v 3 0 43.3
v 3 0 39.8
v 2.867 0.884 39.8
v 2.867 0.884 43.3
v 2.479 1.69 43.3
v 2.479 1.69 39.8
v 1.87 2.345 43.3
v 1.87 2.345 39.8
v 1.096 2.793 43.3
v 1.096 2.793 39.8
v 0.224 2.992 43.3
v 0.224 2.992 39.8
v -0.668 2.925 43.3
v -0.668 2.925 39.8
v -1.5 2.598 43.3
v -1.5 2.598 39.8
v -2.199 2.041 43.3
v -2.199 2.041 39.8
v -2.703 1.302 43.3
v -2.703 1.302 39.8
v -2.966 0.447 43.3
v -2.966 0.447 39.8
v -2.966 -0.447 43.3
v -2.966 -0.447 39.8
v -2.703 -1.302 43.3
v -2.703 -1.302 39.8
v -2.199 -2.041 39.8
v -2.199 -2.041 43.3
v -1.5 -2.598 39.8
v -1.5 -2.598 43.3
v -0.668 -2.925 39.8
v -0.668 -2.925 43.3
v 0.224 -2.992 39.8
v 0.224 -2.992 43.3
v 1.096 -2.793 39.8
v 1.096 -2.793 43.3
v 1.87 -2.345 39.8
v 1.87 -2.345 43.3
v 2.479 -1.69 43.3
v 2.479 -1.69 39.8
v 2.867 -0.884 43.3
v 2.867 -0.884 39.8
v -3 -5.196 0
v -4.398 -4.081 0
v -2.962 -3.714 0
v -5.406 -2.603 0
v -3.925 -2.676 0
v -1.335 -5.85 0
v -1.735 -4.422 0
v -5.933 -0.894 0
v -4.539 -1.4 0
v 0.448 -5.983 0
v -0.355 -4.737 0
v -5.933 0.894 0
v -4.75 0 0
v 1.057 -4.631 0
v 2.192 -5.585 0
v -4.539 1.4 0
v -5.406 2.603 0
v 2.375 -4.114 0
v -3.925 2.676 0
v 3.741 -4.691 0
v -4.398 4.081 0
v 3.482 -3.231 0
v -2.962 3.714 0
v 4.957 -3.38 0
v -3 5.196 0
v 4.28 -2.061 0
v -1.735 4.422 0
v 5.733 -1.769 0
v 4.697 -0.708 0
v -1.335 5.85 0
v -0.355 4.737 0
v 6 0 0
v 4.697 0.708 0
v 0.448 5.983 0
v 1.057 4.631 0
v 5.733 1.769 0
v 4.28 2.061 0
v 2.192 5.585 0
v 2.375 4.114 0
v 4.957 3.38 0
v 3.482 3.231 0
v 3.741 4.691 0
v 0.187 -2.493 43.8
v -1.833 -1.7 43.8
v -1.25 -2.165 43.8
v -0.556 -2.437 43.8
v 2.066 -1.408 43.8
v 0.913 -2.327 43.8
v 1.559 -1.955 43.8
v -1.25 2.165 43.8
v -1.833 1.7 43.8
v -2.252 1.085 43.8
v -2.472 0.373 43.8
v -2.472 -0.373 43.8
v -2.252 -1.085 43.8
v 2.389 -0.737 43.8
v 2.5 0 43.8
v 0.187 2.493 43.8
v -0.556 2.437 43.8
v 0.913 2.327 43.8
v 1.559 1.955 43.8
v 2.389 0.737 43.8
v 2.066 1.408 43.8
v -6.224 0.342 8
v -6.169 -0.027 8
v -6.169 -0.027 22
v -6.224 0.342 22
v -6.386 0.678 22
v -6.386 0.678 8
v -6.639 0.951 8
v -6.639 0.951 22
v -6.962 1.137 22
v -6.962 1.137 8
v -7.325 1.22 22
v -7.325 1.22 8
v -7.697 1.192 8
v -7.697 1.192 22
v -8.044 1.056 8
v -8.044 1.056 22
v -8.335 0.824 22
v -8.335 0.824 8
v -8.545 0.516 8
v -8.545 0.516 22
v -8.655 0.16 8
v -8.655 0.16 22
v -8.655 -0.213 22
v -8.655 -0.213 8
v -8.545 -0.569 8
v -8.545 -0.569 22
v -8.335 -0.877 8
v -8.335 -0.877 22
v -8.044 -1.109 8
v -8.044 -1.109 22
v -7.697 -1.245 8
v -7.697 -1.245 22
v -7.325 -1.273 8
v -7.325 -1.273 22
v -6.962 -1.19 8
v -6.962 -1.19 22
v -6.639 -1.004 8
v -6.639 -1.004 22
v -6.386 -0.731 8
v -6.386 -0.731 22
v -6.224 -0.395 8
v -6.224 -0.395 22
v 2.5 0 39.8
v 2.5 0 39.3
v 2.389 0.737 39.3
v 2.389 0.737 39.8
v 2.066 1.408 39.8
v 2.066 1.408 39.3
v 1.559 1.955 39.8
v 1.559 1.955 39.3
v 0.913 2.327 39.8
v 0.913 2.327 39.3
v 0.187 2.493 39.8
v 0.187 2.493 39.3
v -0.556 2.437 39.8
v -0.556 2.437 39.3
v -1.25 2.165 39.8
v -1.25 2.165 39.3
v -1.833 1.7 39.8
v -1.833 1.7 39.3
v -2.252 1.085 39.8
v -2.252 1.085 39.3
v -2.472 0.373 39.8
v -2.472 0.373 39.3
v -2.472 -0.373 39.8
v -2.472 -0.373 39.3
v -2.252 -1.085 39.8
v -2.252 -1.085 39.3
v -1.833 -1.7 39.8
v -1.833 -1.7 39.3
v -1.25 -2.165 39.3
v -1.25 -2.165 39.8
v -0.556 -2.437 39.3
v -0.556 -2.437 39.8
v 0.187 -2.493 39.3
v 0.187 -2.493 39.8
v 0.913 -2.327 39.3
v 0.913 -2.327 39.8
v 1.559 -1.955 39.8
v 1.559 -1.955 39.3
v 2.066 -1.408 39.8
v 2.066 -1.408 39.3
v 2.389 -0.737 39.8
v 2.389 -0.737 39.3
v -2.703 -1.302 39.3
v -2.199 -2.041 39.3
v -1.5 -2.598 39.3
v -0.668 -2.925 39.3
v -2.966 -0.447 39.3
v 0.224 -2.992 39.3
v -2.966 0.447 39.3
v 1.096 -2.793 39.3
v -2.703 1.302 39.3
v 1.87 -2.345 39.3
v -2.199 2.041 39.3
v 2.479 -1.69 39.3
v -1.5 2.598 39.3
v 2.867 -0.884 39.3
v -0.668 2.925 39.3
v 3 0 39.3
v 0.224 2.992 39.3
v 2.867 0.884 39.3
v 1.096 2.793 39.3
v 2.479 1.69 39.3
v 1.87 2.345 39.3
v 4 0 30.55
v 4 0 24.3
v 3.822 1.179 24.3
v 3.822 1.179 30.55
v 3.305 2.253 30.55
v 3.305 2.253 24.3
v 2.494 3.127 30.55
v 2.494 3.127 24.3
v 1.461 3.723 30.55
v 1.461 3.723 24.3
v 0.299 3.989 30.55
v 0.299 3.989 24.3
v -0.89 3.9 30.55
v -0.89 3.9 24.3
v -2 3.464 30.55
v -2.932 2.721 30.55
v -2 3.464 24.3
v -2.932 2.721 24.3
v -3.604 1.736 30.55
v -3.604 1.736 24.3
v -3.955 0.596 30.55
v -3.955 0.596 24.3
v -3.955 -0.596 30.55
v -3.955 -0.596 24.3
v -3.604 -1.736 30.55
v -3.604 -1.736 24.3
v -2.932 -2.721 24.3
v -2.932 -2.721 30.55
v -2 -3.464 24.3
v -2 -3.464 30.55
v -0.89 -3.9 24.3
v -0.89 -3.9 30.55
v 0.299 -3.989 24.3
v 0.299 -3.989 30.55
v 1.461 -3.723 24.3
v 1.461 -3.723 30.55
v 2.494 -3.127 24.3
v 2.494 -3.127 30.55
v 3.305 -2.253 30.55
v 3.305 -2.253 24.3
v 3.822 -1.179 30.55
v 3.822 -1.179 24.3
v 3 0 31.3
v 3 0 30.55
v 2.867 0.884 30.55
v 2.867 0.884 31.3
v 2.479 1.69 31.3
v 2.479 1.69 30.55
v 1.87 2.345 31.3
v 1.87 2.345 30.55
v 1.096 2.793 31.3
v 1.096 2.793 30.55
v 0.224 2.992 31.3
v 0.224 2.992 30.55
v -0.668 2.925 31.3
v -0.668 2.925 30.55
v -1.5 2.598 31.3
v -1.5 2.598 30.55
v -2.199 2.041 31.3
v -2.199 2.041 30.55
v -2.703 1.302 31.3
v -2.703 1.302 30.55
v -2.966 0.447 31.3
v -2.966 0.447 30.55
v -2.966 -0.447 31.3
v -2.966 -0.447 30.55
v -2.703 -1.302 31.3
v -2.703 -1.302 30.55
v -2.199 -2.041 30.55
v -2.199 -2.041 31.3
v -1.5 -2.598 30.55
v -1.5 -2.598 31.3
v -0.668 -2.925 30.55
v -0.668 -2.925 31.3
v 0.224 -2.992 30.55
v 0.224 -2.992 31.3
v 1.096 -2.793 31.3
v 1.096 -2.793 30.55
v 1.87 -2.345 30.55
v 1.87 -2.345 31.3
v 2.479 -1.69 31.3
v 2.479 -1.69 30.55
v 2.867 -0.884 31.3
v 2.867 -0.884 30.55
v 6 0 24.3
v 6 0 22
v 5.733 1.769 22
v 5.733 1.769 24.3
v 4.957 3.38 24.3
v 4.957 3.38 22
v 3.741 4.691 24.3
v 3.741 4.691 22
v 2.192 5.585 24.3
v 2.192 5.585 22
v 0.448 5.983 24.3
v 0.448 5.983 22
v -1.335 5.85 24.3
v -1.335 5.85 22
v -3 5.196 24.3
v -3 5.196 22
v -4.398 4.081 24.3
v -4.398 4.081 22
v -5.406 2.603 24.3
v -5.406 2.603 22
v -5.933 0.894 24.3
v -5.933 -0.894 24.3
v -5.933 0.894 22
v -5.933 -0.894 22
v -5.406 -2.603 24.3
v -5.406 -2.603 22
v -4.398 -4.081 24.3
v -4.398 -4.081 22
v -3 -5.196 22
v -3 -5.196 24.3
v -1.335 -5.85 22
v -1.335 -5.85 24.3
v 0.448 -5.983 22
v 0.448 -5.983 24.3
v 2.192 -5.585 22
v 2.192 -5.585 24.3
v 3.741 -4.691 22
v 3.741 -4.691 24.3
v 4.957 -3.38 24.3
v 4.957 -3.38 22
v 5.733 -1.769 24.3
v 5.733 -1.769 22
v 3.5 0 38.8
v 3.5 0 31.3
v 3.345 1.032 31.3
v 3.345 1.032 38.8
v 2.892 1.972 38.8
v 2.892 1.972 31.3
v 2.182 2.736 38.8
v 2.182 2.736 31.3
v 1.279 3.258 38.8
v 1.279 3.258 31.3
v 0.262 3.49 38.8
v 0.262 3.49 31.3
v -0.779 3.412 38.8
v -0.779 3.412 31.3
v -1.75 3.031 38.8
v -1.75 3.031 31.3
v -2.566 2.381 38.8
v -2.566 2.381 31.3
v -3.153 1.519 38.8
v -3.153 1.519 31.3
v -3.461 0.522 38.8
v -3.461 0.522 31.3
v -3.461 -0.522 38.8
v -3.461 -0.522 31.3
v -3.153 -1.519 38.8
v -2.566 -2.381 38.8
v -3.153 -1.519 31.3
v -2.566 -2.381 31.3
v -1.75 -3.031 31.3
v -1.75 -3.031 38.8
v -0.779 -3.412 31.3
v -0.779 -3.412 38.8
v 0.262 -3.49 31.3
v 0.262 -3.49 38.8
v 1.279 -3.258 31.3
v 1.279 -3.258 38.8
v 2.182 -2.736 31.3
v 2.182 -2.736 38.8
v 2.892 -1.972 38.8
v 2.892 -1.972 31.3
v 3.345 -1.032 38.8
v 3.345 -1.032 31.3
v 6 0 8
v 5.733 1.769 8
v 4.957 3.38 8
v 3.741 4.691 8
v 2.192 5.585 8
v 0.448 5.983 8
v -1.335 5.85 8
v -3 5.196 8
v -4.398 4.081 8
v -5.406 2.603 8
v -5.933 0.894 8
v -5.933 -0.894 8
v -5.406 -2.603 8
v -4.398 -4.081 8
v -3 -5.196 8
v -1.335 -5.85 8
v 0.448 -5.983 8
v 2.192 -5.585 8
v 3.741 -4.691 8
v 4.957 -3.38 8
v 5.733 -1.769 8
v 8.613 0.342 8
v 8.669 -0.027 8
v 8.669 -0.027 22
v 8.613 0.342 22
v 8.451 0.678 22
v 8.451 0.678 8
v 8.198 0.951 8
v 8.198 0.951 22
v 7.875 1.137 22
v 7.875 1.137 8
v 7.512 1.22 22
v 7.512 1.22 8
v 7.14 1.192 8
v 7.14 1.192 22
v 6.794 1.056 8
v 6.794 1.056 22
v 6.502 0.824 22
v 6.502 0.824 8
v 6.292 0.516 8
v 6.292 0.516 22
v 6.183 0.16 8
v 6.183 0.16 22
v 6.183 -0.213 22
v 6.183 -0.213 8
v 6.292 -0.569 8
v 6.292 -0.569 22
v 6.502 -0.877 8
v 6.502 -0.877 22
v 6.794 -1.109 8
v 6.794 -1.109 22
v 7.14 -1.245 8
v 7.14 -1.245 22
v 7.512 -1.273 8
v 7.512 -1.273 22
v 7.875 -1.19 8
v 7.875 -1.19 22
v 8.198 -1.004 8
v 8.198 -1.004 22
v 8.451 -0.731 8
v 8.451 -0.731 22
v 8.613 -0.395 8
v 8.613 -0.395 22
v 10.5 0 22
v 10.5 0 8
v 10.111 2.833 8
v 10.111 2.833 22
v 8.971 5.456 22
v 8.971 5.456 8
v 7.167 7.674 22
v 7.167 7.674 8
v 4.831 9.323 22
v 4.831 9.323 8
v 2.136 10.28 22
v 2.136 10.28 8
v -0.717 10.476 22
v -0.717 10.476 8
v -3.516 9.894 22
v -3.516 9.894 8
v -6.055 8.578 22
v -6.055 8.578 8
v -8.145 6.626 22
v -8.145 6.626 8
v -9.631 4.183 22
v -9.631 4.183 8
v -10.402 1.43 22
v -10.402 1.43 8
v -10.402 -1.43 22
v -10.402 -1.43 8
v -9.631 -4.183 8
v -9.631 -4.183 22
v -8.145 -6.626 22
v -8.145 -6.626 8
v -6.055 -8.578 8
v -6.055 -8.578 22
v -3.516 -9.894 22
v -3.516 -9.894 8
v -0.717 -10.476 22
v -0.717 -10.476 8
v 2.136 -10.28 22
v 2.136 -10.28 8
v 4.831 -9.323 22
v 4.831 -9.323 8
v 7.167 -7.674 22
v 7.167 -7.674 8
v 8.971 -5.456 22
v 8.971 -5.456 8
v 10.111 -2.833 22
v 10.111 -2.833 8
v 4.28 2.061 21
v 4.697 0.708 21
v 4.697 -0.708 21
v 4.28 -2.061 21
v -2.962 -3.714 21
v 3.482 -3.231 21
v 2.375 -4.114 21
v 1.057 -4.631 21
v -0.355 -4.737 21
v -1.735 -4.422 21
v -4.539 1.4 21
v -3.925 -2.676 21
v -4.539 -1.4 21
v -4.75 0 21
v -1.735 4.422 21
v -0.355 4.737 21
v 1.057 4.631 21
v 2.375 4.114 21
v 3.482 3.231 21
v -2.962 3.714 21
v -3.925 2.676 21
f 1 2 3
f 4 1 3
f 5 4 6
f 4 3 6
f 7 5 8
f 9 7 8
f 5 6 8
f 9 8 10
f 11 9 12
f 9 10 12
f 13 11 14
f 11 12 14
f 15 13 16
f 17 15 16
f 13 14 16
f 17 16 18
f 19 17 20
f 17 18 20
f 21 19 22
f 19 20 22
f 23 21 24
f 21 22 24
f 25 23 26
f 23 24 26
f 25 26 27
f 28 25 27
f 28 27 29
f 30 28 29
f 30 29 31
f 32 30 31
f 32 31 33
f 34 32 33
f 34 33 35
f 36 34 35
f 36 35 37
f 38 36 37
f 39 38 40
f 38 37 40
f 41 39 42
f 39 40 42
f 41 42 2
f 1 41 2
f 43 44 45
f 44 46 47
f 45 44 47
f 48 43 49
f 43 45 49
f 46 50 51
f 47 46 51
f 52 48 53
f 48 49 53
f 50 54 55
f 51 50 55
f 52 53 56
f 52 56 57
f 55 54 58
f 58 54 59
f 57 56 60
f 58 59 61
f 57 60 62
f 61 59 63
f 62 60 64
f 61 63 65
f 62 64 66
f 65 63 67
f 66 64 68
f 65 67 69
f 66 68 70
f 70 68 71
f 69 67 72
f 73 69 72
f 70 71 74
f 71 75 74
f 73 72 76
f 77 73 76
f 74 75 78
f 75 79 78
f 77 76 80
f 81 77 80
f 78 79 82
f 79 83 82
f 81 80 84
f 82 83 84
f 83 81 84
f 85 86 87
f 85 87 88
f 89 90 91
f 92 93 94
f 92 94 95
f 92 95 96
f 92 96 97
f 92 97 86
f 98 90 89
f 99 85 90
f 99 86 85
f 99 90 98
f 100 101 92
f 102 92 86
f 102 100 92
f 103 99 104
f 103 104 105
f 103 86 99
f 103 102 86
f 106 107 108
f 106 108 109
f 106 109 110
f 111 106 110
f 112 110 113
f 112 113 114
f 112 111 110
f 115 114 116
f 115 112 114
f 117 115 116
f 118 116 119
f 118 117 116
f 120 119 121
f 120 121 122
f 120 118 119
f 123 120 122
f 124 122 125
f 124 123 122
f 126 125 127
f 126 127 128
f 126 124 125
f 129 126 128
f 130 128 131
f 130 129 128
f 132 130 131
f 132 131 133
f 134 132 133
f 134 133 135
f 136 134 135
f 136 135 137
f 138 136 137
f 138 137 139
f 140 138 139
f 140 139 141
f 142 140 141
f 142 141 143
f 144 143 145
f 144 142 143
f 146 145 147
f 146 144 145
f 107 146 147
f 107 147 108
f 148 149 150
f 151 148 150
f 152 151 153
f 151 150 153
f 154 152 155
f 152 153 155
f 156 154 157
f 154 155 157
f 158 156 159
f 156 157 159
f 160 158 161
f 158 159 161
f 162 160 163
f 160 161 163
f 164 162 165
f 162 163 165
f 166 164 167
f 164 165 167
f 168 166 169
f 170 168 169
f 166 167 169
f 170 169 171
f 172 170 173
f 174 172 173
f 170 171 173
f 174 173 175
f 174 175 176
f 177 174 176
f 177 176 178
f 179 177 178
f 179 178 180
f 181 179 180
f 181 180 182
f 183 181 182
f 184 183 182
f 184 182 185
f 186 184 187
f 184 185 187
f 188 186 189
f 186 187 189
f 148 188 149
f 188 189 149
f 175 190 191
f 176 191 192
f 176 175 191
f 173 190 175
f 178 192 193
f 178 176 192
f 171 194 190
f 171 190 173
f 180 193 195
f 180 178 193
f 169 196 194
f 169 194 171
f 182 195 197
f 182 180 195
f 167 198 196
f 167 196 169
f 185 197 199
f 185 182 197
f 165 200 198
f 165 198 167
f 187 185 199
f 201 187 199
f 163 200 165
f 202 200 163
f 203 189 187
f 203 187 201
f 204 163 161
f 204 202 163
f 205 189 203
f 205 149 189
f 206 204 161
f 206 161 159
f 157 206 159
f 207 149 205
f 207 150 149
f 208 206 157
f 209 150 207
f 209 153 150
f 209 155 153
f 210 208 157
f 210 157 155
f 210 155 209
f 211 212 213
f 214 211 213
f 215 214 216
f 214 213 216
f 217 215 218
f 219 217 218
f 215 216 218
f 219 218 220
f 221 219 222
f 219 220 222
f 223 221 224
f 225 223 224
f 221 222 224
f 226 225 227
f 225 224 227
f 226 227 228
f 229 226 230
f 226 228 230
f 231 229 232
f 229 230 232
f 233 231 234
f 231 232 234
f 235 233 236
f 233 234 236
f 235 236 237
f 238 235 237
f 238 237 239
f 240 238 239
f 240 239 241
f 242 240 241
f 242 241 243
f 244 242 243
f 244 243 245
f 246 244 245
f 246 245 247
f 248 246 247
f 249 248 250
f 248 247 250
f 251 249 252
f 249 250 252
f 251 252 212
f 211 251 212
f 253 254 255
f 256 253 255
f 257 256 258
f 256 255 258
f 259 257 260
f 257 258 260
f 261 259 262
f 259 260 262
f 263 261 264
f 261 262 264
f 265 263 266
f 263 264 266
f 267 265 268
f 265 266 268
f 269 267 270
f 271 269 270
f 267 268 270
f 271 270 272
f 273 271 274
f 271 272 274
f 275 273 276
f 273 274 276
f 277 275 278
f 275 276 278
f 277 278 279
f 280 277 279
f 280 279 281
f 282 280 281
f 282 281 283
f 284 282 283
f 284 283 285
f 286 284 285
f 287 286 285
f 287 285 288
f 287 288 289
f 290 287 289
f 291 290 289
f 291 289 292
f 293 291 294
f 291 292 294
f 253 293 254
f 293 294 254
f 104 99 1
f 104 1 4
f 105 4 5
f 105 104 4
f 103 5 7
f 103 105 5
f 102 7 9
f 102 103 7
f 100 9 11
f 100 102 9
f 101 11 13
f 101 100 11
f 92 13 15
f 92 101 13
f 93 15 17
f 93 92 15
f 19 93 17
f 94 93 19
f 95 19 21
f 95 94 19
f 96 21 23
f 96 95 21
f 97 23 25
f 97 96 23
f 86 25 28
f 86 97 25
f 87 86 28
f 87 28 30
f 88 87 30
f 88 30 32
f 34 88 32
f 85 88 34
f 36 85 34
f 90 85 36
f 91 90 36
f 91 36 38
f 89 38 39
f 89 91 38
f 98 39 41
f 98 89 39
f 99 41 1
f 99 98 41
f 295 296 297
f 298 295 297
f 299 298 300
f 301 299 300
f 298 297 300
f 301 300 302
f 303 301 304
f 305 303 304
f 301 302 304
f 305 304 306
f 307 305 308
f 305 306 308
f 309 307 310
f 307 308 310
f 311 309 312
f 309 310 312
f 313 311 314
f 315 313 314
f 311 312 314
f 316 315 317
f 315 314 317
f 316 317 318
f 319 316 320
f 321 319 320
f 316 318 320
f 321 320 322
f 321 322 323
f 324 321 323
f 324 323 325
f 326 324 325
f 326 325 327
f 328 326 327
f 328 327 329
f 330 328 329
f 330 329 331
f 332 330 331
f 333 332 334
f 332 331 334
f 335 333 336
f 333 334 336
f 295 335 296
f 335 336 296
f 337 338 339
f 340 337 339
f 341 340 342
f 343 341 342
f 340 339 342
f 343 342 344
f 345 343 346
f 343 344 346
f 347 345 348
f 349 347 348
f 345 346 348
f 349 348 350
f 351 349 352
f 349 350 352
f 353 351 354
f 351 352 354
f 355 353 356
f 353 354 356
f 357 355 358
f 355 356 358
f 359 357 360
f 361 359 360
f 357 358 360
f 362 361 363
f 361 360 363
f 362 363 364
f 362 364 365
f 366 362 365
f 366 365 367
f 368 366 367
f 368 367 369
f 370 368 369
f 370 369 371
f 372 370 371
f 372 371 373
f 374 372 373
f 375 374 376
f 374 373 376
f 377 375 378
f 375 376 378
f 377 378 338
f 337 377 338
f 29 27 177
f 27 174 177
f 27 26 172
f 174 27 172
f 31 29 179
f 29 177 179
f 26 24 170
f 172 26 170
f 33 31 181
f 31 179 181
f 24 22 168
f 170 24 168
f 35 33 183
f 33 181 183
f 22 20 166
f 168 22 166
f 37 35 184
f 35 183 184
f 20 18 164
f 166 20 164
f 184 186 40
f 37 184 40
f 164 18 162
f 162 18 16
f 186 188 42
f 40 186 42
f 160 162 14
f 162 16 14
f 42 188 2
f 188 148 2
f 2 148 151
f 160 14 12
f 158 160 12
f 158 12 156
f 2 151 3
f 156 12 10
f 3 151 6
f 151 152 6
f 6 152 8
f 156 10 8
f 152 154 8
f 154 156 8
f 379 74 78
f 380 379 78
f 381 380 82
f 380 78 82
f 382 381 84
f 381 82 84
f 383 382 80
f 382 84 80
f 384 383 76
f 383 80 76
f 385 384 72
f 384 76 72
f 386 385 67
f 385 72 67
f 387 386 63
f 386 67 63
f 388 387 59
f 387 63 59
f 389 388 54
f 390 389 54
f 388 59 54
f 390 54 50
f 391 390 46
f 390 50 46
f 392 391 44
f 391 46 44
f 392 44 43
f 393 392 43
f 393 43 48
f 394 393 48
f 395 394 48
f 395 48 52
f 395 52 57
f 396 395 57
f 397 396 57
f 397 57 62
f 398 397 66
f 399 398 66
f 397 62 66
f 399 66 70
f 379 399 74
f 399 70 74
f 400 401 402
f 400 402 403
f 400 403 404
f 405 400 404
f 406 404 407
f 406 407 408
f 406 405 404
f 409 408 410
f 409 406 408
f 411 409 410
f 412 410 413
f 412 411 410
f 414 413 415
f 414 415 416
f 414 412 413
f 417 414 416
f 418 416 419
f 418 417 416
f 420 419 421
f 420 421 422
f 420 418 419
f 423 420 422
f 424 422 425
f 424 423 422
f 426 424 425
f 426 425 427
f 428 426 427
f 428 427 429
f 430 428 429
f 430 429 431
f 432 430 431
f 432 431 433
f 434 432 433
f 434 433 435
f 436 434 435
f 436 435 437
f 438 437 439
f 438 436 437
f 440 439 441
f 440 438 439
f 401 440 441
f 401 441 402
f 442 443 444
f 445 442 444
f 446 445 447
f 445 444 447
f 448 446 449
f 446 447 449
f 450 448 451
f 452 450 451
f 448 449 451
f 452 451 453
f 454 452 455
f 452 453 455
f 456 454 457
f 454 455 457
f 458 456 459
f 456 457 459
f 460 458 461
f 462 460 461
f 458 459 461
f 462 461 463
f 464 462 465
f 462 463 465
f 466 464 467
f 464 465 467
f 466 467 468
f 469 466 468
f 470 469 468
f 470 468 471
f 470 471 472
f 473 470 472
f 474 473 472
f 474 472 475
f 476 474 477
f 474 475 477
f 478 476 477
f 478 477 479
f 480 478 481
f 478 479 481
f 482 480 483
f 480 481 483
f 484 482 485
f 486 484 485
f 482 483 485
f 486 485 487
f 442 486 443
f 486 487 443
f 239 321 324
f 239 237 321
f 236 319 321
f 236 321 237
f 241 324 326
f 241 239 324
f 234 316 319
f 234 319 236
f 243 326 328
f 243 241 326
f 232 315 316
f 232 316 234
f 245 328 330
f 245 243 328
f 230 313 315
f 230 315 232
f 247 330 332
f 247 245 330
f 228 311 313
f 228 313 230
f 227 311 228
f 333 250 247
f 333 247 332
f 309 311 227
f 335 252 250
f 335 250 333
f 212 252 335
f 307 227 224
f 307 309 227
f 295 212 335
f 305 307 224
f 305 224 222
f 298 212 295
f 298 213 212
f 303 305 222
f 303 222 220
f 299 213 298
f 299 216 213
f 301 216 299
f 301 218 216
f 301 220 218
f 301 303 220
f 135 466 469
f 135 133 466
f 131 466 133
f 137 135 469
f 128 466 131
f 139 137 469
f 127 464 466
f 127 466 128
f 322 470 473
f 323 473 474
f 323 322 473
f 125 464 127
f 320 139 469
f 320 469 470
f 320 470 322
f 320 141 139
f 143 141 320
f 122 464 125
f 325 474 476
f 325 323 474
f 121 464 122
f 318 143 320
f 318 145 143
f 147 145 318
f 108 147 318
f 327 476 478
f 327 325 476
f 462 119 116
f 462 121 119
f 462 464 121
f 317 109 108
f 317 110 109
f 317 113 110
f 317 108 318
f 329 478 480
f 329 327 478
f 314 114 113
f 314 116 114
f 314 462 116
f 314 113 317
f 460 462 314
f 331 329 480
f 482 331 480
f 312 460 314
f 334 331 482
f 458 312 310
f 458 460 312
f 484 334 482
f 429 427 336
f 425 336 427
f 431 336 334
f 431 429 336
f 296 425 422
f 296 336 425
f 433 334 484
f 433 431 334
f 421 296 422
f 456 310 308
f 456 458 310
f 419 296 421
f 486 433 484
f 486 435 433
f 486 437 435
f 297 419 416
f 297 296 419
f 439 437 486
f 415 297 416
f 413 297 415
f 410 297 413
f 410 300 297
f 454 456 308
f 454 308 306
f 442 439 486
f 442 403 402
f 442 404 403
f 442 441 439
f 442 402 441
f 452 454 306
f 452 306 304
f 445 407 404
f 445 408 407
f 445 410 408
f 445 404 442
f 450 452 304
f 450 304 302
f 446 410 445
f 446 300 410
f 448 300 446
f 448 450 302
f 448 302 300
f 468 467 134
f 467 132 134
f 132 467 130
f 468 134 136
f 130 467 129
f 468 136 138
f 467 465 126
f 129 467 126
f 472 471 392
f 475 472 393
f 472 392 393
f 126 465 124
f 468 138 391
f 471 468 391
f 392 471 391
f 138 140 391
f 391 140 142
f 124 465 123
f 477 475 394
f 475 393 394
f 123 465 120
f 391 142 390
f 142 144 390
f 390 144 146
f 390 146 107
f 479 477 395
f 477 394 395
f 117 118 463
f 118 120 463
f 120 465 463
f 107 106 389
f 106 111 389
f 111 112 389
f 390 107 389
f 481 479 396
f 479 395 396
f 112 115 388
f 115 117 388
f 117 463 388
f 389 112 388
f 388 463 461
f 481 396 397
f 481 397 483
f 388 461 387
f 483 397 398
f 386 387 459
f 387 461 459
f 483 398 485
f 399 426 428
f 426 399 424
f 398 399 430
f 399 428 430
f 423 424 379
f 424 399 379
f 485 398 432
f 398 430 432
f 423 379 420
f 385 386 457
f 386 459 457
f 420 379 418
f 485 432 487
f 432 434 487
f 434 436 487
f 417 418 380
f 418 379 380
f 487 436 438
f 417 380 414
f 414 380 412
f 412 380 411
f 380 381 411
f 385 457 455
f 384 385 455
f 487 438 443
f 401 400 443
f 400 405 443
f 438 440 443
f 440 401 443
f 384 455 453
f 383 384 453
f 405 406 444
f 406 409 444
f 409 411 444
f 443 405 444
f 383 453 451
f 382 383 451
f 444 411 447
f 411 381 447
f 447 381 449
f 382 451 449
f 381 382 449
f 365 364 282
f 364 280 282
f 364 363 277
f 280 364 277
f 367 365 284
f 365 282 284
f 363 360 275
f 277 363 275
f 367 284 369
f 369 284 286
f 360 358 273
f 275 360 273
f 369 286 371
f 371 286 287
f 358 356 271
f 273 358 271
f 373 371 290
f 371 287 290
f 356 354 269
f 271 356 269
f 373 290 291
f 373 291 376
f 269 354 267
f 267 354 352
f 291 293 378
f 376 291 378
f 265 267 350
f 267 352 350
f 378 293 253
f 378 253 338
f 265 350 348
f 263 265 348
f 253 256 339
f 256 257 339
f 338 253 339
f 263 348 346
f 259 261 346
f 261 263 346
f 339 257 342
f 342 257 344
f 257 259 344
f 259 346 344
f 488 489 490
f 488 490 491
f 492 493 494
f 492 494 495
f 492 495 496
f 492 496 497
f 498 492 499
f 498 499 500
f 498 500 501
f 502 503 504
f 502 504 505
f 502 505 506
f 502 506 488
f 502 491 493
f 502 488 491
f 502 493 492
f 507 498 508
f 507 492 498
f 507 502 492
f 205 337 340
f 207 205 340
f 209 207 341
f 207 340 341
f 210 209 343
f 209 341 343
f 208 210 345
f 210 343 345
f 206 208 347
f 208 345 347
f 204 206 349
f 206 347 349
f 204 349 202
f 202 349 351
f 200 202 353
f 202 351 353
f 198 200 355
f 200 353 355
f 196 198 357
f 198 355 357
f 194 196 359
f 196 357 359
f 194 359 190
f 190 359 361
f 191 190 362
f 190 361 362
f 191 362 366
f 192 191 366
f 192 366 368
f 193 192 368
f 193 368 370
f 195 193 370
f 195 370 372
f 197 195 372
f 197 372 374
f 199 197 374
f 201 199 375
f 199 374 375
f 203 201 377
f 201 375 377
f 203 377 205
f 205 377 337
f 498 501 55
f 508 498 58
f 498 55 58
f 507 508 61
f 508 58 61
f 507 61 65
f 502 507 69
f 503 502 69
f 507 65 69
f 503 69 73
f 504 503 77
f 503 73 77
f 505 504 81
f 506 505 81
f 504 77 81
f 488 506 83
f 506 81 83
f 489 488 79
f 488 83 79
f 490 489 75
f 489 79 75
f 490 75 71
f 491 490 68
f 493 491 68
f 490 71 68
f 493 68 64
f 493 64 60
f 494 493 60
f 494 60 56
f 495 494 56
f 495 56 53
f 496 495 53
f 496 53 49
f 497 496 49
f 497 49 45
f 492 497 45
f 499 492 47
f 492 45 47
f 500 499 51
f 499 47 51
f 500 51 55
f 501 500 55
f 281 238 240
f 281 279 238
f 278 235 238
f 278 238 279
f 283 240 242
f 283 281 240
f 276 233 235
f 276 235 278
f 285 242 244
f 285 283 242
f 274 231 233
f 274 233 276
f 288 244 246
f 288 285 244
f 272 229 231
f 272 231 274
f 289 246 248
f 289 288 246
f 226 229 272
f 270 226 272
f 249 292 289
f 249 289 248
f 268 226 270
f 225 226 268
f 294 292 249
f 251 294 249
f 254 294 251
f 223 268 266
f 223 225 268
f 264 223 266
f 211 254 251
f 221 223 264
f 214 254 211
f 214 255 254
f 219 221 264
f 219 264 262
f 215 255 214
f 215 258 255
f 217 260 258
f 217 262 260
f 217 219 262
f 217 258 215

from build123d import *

# Parameters (mm, degrees)
ESQUISSE1_R             = 6
BOSS_EXTRU_1_DEPTH      = 8
ESQUISSE2_R             = 10.5
ESQUISSE2_R_2           = 1.25
BOSS_EXTRU_2_DEPTH      = 14
ESQUISSE3_R             = 6
BOSS_EXTRU_3_DEPTH      = 2.3
ESQUISSE4_R             = 4
BOSS_EXTRU_4_DEPTH      = 6.25
ESQUISSE5_R             = 3
BOSS_EXTRU_5_DEPTH      = 0.75
ESQUISSE7_R             = 3.5
BOSS_EXTRU_6_DEPTH      = 8
ESQUISSE8_R             = 2.5
BOSS_EXTRU_7_DEPTH      = 0.5
ESQUISSE9_R             = 3
BOSS_EXTRU_8_DEPTH      = 4
ESQUISSE10_R            = 4.75
ENL_V_MAT_EXTRU_1_DEPTH = 21
CHANFREIN1_SIZE         = 0.5
CHANFREIN2_SIZE         = 0.5


with BuildPart() as part:
    # Esquisse1 → Boss.-Extru.1 (new body)
    with BuildSketch(Plane.XY):
        Circle(ESQUISSE1_R)
    extrude(amount=BOSS_EXTRU_1_DEPTH)

    # Esquisse2 → Boss.-Extru.2 (add)
    with BuildSketch(Plane.XY.offset(8)):
        Circle(ESQUISSE2_R)
        with Locations((-7.418567839, -0.026589849)):
            Circle(ESQUISSE2_R_2, mode=Mode.SUBTRACT)
        with Locations((7.418567839, -0.026589849)):
            Circle(ESQUISSE2_R_2, mode=Mode.SUBTRACT)
    extrude(amount=BOSS_EXTRU_2_DEPTH)

    # Esquisse3 → Boss.-Extru.3 (add)
    with BuildSketch(Plane.XY.offset(22)):
        Circle(ESQUISSE3_R)
    extrude(amount=BOSS_EXTRU_3_DEPTH)

    # Esquisse4 → Boss.-Extru.4 (add)
    with BuildSketch(Plane.XY.offset(24.3)):
        Circle(ESQUISSE4_R)
    extrude(amount=BOSS_EXTRU_4_DEPTH)

    # Esquisse5 → Boss.-Extru.5 (add)
    with BuildSketch(Plane.XY.offset(30.55)):
        Circle(ESQUISSE5_R)
    extrude(amount=BOSS_EXTRU_5_DEPTH)

    # Esquisse7 → Boss.-Extru.6 (add)
    with BuildSketch(Plane.XY.offset(31.3)):
        Circle(ESQUISSE7_R)
    extrude(amount=BOSS_EXTRU_6_DEPTH)

    # Esquisse8 → Boss.-Extru.7 (add)
    with BuildSketch(Plane.XY.offset(39.3)):
        Circle(ESQUISSE8_R)
    extrude(amount=BOSS_EXTRU_7_DEPTH)

    # Esquisse9 → Boss.-Extru.8 (add)
    with BuildSketch(Plane.XY.offset(39.8)):
        Circle(ESQUISSE9_R)
    extrude(amount=BOSS_EXTRU_8_DEPTH)

    # Esquisse10 → Enlèv. mat.-Extru.1 (cut)
    with BuildSketch(Plane(origin=(0, 0, 0), x_dir=(-1, 0, 0), z_dir=(0, 0, -1))):
        Circle(ESQUISSE10_R)
    extrude(amount=-ENL_V_MAT_EXTRU_1_DEPTH, mode=Mode.SUBTRACT)

    # Chanfrein1
    chanfrein1_edges = [part.edges().sort_by_distance(p)[0] for p in [
        (-3.5, 0, 39.3),
    ]]
    chamfer(chanfrein1_edges, length=CHANFREIN1_SIZE)

    # Chanfrein2
    chanfrein2_edges = [part.edges().sort_by_distance(p)[0] for p in [
        (-3, 0, 43.8),
    ]]
    chamfer(chanfrein2_edges, length=CHANFREIN2_SIZE)


solid = part.part
